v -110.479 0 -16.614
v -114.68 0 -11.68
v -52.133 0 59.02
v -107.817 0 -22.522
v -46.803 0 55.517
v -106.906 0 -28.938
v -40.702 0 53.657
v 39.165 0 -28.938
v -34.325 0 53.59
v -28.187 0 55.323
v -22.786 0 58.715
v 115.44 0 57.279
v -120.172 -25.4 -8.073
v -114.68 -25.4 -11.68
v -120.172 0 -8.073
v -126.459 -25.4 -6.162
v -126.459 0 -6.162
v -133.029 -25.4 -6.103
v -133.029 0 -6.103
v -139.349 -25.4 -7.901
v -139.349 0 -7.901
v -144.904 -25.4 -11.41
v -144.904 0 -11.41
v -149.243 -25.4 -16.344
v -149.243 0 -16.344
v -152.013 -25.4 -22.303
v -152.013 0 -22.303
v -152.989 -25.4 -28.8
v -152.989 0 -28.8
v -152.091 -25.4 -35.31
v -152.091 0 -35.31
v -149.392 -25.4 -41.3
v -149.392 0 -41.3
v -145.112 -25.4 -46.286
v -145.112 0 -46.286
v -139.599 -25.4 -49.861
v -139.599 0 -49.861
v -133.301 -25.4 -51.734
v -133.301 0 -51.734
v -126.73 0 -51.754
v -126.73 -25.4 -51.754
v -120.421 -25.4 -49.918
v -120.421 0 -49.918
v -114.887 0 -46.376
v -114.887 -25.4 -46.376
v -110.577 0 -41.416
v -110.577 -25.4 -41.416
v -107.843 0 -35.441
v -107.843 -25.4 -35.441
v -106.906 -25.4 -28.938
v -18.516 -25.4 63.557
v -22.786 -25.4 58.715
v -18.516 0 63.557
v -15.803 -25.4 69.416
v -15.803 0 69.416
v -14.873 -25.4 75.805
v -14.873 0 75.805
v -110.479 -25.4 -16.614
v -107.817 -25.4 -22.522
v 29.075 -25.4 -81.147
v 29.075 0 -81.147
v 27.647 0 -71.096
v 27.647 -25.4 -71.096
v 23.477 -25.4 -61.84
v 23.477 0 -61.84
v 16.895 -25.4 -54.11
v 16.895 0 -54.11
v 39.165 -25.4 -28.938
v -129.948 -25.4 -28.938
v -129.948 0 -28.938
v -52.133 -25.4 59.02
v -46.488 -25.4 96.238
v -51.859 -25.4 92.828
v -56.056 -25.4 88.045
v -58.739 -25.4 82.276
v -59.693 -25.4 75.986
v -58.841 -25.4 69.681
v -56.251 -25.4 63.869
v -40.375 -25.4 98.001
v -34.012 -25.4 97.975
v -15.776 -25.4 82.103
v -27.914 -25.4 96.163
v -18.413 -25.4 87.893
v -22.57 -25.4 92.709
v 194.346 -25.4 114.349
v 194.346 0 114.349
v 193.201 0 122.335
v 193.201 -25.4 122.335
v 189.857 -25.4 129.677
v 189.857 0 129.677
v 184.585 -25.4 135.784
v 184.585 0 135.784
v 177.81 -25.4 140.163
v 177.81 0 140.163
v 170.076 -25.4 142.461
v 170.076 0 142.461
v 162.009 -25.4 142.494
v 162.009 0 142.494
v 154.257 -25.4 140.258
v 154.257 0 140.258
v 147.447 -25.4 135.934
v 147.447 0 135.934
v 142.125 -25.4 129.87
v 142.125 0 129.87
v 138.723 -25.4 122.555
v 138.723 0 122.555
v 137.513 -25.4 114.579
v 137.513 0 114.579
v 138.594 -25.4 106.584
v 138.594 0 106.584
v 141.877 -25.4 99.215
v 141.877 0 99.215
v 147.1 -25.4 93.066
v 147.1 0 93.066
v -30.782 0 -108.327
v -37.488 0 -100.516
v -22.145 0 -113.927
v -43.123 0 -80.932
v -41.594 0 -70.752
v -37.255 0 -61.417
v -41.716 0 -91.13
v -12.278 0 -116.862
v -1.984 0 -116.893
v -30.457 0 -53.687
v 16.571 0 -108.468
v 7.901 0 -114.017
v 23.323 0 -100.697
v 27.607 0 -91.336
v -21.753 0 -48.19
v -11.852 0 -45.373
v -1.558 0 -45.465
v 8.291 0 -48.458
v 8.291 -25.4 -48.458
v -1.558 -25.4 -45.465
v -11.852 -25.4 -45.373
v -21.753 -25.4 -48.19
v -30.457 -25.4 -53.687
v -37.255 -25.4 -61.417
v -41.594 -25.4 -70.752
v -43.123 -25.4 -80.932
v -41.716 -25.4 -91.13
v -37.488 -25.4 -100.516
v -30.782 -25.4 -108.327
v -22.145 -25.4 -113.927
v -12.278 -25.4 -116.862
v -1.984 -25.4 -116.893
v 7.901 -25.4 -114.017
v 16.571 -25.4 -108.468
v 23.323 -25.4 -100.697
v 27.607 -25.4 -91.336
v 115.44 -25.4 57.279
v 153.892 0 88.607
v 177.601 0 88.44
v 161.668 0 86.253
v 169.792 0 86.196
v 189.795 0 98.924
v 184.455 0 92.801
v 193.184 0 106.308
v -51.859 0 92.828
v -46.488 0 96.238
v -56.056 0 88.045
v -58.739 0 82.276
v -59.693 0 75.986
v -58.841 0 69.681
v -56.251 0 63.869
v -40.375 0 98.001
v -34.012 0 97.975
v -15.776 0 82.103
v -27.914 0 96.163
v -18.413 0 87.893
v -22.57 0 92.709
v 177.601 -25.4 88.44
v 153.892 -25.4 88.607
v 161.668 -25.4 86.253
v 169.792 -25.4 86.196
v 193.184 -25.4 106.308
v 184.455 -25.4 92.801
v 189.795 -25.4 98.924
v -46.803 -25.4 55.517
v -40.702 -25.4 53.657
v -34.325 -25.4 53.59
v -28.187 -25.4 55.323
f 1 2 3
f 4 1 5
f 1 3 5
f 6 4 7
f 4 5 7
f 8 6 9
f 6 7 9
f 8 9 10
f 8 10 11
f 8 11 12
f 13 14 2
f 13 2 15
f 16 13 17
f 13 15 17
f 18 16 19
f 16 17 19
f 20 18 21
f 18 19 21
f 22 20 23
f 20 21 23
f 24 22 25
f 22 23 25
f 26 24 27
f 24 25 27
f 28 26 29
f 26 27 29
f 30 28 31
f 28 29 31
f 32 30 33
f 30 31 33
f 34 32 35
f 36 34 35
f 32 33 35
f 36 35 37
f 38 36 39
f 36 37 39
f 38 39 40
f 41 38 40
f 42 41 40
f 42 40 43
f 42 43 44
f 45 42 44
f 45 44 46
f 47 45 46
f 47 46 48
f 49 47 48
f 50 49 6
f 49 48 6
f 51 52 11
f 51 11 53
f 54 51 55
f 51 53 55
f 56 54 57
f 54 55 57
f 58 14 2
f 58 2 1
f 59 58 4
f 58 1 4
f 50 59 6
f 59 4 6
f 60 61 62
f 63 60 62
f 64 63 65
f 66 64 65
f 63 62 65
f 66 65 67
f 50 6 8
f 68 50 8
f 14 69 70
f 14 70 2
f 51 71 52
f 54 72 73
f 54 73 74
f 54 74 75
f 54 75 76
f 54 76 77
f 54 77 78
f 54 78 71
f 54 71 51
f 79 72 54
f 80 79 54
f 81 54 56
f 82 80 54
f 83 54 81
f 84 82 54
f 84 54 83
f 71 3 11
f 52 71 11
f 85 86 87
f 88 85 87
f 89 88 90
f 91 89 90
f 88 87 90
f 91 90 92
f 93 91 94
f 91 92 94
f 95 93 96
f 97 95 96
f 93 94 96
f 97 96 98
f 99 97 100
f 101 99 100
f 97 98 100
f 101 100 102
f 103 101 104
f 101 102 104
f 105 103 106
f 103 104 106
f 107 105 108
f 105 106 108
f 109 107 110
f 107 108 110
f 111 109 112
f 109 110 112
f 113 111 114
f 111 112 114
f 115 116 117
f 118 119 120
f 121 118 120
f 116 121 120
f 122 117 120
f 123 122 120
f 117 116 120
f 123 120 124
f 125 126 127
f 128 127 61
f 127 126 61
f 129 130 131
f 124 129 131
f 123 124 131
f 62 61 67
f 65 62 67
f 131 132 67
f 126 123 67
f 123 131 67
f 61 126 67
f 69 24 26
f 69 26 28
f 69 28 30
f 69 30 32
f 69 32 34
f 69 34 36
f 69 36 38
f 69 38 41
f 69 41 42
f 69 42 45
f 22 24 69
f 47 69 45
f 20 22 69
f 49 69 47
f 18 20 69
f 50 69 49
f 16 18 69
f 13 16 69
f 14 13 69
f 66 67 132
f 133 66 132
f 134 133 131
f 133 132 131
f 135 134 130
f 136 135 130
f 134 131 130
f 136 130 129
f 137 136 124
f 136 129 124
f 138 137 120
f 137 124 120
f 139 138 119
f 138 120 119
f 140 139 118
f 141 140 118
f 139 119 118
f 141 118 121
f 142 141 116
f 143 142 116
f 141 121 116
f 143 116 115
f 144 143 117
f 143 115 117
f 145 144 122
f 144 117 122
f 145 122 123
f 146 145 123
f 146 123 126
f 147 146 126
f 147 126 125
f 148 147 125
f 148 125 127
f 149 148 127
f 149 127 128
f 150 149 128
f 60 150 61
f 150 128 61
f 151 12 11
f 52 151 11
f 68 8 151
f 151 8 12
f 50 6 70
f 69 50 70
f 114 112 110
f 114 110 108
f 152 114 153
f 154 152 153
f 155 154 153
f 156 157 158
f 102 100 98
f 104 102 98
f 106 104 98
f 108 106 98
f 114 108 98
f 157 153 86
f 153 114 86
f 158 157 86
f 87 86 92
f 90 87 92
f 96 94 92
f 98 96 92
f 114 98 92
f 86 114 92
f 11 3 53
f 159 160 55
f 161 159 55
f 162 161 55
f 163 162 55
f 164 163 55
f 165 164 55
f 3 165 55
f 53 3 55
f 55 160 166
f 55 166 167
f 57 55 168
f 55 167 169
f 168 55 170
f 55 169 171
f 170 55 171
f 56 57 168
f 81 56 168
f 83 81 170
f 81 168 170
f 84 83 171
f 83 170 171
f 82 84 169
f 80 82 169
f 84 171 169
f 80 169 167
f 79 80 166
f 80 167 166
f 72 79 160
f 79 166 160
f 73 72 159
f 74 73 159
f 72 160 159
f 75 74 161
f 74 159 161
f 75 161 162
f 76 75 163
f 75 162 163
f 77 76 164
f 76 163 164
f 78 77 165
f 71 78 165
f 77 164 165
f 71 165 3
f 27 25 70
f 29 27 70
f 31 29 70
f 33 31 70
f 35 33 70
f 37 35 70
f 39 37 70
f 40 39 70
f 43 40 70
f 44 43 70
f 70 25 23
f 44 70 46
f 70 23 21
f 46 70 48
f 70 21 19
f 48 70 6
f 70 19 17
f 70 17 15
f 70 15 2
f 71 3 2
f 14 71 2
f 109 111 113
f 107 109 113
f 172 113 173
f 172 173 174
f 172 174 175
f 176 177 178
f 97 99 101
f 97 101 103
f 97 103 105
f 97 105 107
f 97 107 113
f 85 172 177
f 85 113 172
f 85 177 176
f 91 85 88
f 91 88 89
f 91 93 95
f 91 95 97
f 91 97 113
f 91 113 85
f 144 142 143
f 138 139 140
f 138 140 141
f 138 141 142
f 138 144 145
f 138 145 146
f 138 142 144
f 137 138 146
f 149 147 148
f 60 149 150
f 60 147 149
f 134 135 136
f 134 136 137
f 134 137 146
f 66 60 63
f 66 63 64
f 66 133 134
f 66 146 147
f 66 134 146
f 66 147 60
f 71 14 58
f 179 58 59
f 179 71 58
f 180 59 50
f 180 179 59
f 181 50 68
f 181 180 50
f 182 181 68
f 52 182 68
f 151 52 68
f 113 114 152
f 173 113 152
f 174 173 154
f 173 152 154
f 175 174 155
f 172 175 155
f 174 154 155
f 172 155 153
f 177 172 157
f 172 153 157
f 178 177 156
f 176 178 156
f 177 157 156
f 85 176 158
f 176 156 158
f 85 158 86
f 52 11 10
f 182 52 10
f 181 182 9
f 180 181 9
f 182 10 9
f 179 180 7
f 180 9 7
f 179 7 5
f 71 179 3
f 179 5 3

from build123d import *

# Parameters (mm, degrees)
F1_DEPTH = 25.4


with BuildPart() as f1:
    # F0 (on Front) → F1 (new body)
    with BuildSketch(Plane.XZ):
        with BuildLine():
            Line((-106.9061532036, -28.9377868176), (-129.9478113651, -28.9377868176))
            Line((-129.9478113651, -28.9377868176), (-114.6803066145, -11.6802867227))
            ThreePointArc((-114.6803066145, -11.6802867227), (-150.9562220175, -38.4016492793), (-106.9061532036, -28.9377868176))
        make_face()
    extrude(amount=F1_DEPTH)


with BuildPart() as f1b:
    # F0 (on Front) → F1, piece 2 (new body)
    with BuildSketch(Plane.XZ):
        with BuildLine():
            ThreePointArc((194.3457171495, 114.3488910523), (154.2573533816, 140.2581148478), (147.0998454016, 93.0655850704))
            ThreePointArc((147.0998454016, 93.0655850704), (177.6005119431, 88.4396672568), (194.3457171495, 114.3488910523))
        make_face()
    extrude(amount=F1_DEPTH)


with BuildPart() as f1c:
    # F0 (on Front) → F1, piece 3 (new body)
    with BuildSketch(Plane.XZ):
        with BuildLine():
            ThreePointArc((29.0746289373, -81.1474440853), (25.8891745461, -66.3205712619), (16.8949946285, -54.1104113526))
            ThreePointArc((16.8949946285, -54.1104113526), (-39.9378668388, -95.9743169088), (29.0746289373, -81.1474440853))
        make_face()
    extrude(amount=F1_DEPTH)


with BuildPart() as f1d:
    # F0 (on Front) → F1, piece 4 (new body)
    with BuildSketch(Plane.XZ):
        with BuildLine():
            Line((-52.1326156147, 59.019988207), (-114.6803066145, -11.6802867227))
            ThreePointArc((-114.6803066145, -11.6802867227), (-108.9394007128, -19.4739243558), (-106.9061532036, -28.9377868176))
            Line((-106.9061532036, -28.9377868176), (39.1649156809, -28.9377868176))
            Line((39.1649156809, -28.9377868176), (115.4399755566, 57.2791081198))
            Line((115.4399755566, 57.2791081198), (-22.7859247841, 58.7151109634))
            ThreePointArc((-22.7859247841, 58.7151109634), (-37.5161185324, 53.3954768475), (-52.1326156147, 59.019988207))
        make_face()
    extrude(amount=F1_DEPTH)


with BuildPart() as f1e:
    # F0 (on Front) → F1, piece 5 (new body)
    with BuildSketch(Plane.XZ):
        with BuildLine():
            ThreePointArc((-14.8728026772, 75.8047774434), (-46.4879444812, 96.2377337264), (-52.1326156147, 59.019988207))
            Line((-52.1326156147, 59.019988207), (-22.7859247841, 58.7151109634))
            ThreePointArc((-22.7859247841, 58.7151109634), (-16.9470788229, 66.3883794873), (-14.8728026772, 75.8047774434))
        make_face()
    extrude(amount=F1_DEPTH)


solid = Compound([f1.part, f1b.part, f1c.part, f1d.part, f1e.part])
